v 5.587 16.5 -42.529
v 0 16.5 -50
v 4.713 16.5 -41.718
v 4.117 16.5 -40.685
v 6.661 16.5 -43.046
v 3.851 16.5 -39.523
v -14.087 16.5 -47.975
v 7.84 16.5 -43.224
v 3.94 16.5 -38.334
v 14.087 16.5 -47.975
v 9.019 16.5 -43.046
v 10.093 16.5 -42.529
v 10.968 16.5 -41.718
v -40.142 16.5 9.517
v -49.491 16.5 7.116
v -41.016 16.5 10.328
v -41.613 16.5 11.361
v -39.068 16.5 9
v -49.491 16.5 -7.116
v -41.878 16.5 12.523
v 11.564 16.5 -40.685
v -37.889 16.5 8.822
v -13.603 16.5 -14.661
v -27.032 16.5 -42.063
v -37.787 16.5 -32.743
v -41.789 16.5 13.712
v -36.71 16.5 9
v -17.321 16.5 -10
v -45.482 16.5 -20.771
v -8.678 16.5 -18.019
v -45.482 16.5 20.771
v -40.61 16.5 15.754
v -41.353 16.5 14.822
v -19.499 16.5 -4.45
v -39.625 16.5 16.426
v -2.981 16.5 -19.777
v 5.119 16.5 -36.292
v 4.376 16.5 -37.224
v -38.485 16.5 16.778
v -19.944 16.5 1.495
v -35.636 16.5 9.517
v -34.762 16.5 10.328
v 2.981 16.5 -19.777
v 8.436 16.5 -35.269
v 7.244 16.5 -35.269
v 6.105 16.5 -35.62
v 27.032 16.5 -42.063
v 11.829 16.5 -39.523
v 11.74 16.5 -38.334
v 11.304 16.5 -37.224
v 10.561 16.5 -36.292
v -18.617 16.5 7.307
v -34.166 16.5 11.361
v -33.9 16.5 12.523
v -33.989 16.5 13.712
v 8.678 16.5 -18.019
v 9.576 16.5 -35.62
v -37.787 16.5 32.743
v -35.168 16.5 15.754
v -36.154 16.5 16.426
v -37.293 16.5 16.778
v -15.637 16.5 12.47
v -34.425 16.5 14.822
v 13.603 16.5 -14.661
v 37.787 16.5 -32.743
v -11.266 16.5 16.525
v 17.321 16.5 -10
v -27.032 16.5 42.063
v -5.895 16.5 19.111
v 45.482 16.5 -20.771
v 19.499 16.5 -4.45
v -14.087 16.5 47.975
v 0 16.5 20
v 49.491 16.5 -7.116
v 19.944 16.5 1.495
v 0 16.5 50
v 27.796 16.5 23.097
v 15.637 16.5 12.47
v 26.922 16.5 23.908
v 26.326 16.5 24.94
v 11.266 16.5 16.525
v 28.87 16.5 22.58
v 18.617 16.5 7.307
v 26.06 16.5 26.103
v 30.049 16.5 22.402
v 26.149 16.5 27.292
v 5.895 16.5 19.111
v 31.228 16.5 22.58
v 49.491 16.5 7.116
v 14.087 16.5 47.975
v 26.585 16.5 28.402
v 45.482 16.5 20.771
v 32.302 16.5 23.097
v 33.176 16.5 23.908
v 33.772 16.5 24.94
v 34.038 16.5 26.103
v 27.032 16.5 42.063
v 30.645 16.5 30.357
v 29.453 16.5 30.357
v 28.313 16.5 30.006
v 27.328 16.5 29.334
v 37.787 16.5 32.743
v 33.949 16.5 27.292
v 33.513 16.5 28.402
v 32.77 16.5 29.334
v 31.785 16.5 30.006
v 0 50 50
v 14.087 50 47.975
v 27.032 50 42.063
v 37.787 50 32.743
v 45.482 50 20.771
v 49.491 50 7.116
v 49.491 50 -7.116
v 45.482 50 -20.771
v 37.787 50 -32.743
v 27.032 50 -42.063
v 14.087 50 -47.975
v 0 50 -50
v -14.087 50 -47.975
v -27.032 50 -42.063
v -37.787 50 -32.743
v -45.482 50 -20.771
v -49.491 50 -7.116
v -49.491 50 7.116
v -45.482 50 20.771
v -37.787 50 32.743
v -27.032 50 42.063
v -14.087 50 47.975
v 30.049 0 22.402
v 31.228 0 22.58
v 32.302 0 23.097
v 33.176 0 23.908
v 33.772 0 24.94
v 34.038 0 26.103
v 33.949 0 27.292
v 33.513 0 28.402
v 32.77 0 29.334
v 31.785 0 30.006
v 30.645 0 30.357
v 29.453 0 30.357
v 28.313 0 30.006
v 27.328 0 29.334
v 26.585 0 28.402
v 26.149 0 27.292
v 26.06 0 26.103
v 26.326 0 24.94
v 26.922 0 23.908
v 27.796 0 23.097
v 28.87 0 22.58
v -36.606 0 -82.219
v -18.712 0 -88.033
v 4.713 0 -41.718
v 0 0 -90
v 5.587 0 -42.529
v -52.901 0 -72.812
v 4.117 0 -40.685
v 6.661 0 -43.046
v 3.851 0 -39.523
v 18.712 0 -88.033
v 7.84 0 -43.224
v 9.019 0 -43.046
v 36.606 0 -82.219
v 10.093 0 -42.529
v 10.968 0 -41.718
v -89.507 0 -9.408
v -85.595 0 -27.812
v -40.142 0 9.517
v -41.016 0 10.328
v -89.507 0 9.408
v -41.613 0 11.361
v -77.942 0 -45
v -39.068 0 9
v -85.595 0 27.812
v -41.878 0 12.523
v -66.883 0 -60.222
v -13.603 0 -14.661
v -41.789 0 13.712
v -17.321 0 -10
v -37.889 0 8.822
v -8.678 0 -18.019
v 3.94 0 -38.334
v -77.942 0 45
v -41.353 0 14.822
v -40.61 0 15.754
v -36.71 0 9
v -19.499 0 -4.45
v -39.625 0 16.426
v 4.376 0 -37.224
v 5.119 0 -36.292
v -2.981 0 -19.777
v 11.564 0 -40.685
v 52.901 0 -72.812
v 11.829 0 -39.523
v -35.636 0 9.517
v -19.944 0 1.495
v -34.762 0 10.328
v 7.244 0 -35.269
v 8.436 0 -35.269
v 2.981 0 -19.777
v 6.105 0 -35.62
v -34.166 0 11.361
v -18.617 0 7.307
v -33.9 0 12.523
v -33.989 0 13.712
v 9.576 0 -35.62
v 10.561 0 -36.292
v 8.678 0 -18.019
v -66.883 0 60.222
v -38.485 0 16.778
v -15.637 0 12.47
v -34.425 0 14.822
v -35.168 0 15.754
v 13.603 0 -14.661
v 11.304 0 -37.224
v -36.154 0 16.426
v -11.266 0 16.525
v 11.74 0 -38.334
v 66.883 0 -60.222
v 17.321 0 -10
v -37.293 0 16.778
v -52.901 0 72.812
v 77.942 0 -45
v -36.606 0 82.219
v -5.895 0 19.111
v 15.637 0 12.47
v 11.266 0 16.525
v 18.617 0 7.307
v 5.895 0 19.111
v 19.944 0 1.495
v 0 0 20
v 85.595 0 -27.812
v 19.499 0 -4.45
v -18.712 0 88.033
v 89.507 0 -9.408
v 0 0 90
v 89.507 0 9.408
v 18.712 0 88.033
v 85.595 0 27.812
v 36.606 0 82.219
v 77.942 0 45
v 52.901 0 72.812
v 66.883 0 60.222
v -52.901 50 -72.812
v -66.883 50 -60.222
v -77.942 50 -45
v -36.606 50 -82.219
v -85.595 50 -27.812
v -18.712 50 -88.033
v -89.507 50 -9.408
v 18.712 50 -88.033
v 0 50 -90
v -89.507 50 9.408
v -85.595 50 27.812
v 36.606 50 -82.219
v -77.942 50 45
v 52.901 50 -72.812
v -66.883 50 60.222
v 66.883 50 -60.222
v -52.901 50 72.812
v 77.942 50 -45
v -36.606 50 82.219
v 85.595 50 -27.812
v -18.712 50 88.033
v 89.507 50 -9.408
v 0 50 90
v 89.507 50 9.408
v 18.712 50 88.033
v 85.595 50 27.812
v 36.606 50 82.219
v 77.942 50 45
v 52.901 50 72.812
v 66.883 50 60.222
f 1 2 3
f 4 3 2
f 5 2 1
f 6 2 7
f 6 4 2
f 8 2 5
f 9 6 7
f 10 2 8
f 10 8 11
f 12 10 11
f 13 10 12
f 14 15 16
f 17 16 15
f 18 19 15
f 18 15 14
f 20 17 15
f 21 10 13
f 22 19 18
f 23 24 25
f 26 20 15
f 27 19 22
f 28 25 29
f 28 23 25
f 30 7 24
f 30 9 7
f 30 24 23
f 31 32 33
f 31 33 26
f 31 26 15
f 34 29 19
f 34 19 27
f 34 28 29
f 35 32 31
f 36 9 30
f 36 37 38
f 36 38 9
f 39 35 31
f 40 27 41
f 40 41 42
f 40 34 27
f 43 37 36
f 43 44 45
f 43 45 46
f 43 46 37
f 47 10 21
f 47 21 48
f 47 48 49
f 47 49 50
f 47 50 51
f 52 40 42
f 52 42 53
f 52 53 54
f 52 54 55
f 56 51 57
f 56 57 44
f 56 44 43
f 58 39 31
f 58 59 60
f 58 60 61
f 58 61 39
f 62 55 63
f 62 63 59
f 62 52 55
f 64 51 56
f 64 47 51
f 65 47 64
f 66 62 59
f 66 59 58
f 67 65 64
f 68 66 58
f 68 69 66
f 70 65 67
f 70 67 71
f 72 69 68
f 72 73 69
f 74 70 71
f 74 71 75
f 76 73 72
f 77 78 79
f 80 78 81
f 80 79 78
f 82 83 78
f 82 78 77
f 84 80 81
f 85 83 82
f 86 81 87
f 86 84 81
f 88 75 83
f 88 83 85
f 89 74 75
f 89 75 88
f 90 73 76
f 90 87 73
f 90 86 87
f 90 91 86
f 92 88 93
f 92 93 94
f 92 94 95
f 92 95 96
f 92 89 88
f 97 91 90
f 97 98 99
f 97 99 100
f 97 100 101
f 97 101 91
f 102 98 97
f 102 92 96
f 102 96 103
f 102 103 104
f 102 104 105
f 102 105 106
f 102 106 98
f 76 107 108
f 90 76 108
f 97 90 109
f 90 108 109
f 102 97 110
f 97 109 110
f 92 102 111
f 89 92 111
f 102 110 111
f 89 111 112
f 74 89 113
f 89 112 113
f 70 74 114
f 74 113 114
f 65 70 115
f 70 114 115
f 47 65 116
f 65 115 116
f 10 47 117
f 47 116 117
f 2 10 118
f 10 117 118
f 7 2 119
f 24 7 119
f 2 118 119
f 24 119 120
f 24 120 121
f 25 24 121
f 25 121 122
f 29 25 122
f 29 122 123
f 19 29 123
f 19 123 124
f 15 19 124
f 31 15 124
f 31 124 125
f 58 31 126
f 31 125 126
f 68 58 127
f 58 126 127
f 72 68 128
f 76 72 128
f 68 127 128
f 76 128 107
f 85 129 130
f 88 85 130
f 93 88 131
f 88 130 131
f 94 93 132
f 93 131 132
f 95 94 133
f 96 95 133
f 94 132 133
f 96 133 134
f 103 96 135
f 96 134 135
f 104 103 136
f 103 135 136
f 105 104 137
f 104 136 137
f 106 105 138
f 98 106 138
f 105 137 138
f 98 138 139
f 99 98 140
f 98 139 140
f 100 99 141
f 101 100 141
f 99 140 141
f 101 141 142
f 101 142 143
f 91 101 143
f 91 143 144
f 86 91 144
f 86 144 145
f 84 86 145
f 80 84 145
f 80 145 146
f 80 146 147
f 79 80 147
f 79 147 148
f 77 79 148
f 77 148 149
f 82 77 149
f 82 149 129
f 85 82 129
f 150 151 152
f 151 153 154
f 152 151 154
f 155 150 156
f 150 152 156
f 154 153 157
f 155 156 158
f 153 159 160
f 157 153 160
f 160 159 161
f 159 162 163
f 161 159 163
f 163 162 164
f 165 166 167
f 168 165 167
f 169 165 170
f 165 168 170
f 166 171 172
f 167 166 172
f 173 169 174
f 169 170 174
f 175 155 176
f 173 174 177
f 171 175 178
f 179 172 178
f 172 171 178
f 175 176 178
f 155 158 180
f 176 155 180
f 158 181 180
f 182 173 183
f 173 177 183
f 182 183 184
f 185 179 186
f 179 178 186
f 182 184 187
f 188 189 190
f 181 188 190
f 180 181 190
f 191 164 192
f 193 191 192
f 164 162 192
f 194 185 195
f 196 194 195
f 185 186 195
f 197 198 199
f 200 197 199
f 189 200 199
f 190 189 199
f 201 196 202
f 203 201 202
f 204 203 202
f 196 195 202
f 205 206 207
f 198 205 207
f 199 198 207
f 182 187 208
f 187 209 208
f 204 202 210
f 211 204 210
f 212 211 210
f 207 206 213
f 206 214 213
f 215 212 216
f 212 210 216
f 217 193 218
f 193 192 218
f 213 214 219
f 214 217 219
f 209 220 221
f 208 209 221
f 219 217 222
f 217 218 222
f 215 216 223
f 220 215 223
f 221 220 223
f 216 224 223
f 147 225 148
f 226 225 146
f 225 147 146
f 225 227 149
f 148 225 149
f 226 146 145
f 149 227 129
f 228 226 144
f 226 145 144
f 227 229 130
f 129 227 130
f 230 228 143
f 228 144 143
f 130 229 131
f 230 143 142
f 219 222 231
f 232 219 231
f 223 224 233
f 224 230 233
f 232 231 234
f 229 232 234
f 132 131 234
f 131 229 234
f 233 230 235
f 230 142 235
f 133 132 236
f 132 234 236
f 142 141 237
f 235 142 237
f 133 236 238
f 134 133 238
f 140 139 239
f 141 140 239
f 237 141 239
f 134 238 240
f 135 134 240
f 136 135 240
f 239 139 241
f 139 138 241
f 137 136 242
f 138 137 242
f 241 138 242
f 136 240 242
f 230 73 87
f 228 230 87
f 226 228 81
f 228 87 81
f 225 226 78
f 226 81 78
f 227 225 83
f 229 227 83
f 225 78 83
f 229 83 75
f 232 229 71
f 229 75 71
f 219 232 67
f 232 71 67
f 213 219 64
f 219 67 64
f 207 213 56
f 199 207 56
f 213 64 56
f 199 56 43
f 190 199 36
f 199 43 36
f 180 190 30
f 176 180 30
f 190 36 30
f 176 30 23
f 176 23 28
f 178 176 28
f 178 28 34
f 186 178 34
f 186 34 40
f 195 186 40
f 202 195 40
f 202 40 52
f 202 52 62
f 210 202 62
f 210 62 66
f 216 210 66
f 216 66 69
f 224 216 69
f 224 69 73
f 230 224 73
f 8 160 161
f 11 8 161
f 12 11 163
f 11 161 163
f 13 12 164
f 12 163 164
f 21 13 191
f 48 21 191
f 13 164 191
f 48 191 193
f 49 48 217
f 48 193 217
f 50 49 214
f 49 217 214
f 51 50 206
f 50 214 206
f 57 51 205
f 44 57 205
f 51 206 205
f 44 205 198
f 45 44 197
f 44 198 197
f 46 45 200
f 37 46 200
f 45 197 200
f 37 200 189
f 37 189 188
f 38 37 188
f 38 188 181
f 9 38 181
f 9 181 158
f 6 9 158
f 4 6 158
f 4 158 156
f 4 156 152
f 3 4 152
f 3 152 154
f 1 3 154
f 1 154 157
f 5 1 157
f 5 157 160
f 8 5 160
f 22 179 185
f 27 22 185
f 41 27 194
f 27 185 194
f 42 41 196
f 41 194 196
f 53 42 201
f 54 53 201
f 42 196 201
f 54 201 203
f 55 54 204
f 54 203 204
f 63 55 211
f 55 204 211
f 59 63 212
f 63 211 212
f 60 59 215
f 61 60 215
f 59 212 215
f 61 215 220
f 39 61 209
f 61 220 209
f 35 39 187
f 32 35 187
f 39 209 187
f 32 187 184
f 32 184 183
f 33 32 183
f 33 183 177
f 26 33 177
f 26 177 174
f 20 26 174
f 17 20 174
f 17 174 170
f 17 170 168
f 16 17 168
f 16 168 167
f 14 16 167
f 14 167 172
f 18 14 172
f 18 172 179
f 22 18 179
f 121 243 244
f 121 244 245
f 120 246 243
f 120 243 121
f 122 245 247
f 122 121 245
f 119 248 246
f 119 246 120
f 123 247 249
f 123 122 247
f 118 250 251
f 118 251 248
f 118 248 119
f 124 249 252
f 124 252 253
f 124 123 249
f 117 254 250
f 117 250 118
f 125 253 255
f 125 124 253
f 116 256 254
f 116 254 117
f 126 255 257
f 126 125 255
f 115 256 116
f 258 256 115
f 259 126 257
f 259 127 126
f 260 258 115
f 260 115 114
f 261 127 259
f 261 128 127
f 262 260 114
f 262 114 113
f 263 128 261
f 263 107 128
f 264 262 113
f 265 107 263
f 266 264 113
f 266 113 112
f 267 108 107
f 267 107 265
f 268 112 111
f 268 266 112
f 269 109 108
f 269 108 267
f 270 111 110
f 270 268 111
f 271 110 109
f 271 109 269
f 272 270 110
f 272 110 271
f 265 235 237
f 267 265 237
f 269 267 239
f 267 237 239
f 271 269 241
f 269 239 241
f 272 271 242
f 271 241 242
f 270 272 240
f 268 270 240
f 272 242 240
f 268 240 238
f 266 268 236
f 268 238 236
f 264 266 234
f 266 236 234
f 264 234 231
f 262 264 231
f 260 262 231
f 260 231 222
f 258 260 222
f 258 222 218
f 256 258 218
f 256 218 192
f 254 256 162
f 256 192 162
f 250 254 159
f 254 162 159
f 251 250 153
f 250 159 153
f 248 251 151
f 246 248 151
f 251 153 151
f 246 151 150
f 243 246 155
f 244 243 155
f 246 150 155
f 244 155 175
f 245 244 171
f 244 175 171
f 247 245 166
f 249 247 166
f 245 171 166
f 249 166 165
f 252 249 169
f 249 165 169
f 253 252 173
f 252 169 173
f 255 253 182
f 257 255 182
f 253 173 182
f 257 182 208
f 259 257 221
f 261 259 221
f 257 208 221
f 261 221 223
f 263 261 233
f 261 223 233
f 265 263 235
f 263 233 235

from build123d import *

# Parameters (mm, degrees)
SKETCH1_R           = 90
BOSS_EXTRUDE1_DEPTH = 50
SKETCH2_R           = 50
CUT_EXTRUDE1_DEPTH  = 33.5
SKETCH3_R           = 20
CUT_EXTRUDE2_DEPTH  = 35
SKETCH4_R           = 4
CUT_EXTRUDE3_DEPTH  = 72


with BuildPart() as part:
    # Sketch1 → Boss-Extrude1 (new body)
    with BuildSketch(Plane(origin=(0, 0, 0), x_dir=(1, 0, 0), z_dir=(0, 1, 0))):
        with Locations(Location((0, 0, 0), (0, 0, 270))):
            Circle(SKETCH1_R)
    extrude(amount=BOSS_EXTRUDE1_DEPTH)

    # Sketch2 → Cut-Extrude1 (cut)
    with BuildSketch(Plane(origin=(0, 50, 0), x_dir=(1, 0, 0), z_dir=(0, 1, 0))):
        with Locations(Location((0, 0, 0), (0, 0, 270))):
            Circle(SKETCH2_R)
    extrude(amount=-CUT_EXTRUDE1_DEPTH, mode=Mode.SUBTRACT)

    # Sketch3 → Cut-Extrude2 (cut)
    with BuildSketch(Plane(origin=(0, 16.5, 0), x_dir=(1, 0, 0), z_dir=(0, 1, 0))):
        with Locations(Location((0, 0, 0), (0, 0, 270))):
            Circle(SKETCH3_R)
    extrude(amount=-CUT_EXTRUDE2_DEPTH, mode=Mode.SUBTRACT)

    # Sketch4 → Cut-Extrude3 (cut)
    with BuildSketch(Plane.XZ):
        with Locations(Location((-37.889173801, 12.822266129, 0), (0, 0, 270))):
            Circle(SKETCH4_R)
        with Locations(Location((7.840178699, -39.224120105, 0), (0, 0, 270))):
            Circle(SKETCH4_R)
        with Locations(Location((30.048995102, 26.401853976, 0), (0, 0, 270))):
            Circle(SKETCH4_R)
    extrude(amount=-CUT_EXTRUDE3_DEPTH, mode=Mode.SUBTRACT)


solid = part.part
